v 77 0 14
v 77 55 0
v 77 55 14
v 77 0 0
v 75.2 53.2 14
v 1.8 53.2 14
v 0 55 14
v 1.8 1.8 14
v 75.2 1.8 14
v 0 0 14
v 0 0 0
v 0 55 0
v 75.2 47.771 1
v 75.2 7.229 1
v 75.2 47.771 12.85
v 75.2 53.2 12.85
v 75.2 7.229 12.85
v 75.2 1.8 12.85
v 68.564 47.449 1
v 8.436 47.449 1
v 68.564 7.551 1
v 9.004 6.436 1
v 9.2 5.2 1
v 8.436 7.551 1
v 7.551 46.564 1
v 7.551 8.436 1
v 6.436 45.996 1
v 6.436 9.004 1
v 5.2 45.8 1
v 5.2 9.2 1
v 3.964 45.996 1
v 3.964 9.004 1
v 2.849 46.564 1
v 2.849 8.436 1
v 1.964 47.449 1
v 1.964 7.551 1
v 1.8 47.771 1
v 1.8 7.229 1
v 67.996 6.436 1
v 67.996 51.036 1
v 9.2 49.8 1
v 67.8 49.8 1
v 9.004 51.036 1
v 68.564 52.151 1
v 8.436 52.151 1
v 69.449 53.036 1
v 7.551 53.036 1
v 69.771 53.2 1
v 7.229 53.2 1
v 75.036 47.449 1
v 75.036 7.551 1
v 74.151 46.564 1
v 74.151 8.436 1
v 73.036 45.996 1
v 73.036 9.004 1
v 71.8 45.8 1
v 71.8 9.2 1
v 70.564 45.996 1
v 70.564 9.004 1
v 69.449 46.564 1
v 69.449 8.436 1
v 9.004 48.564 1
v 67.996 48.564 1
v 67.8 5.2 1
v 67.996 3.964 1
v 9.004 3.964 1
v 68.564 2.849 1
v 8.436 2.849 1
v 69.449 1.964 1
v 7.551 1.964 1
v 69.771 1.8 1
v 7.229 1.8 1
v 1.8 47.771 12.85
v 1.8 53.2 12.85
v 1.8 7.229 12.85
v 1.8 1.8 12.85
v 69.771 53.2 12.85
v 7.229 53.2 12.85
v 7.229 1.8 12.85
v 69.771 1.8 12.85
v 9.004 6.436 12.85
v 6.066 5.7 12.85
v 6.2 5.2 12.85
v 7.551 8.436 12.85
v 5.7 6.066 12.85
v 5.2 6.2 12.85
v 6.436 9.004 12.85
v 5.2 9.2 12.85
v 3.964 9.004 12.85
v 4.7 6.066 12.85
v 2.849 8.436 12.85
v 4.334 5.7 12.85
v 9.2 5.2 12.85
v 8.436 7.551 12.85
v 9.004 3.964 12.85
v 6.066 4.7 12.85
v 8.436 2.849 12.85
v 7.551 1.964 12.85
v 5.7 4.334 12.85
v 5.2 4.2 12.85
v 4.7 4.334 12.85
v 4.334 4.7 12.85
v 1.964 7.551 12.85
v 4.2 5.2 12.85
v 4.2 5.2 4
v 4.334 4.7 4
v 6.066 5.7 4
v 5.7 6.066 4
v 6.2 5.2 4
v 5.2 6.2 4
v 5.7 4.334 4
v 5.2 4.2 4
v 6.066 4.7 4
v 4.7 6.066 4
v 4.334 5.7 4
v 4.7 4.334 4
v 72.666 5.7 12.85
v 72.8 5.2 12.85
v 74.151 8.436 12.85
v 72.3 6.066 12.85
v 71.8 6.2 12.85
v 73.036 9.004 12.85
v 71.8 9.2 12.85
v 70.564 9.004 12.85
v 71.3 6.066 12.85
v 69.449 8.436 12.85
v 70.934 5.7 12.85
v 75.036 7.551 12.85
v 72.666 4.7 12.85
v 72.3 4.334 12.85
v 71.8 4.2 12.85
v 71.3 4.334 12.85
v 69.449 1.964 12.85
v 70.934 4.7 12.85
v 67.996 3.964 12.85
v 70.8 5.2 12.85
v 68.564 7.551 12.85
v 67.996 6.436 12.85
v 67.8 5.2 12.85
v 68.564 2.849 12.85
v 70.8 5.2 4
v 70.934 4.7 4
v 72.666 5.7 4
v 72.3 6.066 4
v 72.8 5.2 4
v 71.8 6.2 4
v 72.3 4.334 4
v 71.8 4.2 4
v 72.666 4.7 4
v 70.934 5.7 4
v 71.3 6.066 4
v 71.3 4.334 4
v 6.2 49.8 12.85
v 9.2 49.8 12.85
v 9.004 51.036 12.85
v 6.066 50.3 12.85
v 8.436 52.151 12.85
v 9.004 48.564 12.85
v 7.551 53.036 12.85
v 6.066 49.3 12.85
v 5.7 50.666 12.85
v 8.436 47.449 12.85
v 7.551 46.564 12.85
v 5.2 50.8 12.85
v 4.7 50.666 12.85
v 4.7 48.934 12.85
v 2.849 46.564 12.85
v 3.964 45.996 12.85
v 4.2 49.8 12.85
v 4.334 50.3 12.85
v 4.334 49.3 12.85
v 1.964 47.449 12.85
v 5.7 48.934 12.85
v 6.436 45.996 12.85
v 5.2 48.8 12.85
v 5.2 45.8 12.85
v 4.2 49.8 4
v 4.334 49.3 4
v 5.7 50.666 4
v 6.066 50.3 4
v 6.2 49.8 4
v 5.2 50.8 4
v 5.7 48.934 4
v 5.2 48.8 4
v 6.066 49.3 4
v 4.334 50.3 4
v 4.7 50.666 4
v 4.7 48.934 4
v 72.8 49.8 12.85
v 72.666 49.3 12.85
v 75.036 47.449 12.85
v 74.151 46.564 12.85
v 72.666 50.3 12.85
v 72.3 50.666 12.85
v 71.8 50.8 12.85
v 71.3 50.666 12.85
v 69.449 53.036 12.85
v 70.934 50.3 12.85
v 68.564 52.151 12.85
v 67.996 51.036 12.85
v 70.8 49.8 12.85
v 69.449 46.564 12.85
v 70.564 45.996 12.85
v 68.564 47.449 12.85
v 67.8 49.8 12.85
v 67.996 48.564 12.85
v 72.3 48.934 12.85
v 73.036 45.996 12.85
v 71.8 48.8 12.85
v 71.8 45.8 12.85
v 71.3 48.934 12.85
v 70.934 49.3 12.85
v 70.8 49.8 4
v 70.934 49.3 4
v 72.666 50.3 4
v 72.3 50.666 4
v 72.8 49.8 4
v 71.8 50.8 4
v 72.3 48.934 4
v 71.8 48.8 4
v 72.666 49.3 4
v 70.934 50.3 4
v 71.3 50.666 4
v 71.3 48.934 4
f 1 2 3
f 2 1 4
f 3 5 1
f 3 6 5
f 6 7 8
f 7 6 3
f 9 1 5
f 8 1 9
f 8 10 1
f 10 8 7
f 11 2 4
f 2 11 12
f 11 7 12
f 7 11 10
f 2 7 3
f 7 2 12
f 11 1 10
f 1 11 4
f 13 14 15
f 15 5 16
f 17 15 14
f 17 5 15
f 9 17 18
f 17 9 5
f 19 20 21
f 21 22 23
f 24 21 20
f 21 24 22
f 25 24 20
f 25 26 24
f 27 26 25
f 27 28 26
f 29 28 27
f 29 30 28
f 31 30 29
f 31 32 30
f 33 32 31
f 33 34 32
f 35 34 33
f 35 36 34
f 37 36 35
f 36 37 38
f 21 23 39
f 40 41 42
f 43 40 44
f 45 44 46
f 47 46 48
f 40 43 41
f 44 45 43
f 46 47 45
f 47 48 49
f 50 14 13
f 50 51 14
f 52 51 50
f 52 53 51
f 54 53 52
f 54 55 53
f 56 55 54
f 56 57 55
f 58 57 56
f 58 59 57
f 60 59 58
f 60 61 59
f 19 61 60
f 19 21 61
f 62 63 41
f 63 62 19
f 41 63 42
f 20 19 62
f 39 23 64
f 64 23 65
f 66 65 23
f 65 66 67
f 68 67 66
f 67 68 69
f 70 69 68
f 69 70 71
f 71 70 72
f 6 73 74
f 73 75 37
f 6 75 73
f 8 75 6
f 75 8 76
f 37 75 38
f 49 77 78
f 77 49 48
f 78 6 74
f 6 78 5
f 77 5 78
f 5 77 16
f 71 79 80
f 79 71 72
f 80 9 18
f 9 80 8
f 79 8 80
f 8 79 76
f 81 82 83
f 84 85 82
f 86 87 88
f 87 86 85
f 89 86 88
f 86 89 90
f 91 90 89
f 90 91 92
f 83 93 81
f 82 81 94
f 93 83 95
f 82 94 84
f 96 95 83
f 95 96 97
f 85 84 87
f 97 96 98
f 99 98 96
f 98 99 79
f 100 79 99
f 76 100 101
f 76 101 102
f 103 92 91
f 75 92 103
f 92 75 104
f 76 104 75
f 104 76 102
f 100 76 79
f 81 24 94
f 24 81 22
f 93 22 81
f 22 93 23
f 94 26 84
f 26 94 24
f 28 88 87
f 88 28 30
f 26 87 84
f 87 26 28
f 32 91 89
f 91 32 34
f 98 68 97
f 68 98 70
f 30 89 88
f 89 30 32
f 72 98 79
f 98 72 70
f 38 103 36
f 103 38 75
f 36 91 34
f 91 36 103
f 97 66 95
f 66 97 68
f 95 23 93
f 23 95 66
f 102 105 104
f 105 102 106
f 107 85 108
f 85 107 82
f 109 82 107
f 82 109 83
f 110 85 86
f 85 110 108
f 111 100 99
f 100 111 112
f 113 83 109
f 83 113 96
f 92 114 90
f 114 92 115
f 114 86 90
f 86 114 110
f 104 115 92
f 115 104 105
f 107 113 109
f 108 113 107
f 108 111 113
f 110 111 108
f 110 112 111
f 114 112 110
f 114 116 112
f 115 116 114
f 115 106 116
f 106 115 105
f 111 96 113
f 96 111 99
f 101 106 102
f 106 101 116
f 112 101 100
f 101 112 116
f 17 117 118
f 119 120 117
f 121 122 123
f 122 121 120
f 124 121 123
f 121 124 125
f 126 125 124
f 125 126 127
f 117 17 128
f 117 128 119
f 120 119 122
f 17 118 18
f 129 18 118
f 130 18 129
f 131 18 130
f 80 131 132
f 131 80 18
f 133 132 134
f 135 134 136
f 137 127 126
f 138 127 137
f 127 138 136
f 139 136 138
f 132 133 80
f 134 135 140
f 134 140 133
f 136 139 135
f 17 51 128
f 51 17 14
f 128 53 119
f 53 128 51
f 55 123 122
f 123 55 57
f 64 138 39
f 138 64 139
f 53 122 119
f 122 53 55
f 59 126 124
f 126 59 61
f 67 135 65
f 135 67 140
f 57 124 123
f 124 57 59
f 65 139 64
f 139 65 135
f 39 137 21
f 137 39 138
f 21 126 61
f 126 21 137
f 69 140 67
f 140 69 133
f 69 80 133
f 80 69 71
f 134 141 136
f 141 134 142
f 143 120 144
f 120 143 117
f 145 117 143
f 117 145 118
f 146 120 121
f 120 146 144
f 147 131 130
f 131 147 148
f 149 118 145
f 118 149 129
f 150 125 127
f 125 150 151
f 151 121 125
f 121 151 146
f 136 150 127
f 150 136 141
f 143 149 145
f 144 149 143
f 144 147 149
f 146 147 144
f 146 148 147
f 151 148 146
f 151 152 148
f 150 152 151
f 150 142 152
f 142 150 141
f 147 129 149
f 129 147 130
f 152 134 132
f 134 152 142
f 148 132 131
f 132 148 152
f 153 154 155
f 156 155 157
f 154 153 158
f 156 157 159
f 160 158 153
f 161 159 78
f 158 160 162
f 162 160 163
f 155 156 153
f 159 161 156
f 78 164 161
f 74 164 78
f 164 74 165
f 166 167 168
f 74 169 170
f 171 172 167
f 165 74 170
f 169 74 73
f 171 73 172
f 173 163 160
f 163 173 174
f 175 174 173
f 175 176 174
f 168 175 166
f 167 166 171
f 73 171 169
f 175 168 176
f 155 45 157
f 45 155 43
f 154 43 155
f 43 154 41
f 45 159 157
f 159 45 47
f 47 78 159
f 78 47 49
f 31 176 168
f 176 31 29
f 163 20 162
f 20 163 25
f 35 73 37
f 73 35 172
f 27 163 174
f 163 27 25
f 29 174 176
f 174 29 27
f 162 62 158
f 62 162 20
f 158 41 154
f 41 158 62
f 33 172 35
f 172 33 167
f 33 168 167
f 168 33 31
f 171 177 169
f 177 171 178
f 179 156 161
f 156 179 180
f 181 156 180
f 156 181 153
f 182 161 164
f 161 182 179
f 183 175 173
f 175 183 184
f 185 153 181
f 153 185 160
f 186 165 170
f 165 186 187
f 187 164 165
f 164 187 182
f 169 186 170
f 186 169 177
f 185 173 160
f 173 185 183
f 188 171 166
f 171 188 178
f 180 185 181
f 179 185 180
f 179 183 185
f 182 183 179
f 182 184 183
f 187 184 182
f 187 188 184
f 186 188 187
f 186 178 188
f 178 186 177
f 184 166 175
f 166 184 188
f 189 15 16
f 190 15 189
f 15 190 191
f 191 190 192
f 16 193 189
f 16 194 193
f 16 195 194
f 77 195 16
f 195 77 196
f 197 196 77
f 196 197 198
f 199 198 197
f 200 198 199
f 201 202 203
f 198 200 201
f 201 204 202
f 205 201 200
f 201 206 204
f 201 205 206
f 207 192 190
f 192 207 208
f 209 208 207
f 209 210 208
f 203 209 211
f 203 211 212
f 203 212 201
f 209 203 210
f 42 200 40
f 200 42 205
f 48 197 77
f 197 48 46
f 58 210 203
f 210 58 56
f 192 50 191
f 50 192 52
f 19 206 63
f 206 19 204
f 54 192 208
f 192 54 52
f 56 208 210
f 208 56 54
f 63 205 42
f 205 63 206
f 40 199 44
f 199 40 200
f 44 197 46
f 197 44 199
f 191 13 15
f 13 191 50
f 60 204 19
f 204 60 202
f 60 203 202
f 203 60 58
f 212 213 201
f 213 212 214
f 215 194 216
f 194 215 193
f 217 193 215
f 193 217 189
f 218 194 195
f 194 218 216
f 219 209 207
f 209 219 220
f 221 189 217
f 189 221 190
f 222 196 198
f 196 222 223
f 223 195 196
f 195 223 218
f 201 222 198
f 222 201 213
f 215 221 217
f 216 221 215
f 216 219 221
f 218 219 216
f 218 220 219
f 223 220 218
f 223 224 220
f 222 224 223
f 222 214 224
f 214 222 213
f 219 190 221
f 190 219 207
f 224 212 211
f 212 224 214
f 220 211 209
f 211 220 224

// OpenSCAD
difference(){
  cube([77,55,14]);
  translate([1.8,1.8,1]) cube([73.4,51.4,14]);
}
translate([5.2,5.2]) difference(){
  union(){
  translate([-5.2,-5.2]) cube([5.2,5.2,12.85]);
  cylinder(d=8,h=12.85,$fn=20);
  }
  translate([0,0,4]) cylinder(d=2,h=12,$fn=12);
}
translate([71.8,5.2]) difference(){
  union(){
  translate([0,-5.2]) cube([5.2,5.2,12.85]);
  cylinder(d=8,h=12.85,$fn=20);
  }
  translate([0,0,4]) cylinder(d=2,h=12,$fn=12);
}
translate([5.2,49.8]) difference(){
  union(){
  translate([-5.2,0]) cube([5.2,5.2,12.85]);
  cylinder(d=8,h=12.85,$fn=20);
  }
  translate([0,0,4]) cylinder(d=2,h=12,$fn=12);
}
translate([71.8,49.8]) difference(){
  union(){
  translate([0,0]) cube([5.2,5.2,12.85]);
  cylinder(d=8,h=12.85,$fn=20);
  }
  translate([0,0,4]) cylinder(d=2,h=12,$fn=12);
}
